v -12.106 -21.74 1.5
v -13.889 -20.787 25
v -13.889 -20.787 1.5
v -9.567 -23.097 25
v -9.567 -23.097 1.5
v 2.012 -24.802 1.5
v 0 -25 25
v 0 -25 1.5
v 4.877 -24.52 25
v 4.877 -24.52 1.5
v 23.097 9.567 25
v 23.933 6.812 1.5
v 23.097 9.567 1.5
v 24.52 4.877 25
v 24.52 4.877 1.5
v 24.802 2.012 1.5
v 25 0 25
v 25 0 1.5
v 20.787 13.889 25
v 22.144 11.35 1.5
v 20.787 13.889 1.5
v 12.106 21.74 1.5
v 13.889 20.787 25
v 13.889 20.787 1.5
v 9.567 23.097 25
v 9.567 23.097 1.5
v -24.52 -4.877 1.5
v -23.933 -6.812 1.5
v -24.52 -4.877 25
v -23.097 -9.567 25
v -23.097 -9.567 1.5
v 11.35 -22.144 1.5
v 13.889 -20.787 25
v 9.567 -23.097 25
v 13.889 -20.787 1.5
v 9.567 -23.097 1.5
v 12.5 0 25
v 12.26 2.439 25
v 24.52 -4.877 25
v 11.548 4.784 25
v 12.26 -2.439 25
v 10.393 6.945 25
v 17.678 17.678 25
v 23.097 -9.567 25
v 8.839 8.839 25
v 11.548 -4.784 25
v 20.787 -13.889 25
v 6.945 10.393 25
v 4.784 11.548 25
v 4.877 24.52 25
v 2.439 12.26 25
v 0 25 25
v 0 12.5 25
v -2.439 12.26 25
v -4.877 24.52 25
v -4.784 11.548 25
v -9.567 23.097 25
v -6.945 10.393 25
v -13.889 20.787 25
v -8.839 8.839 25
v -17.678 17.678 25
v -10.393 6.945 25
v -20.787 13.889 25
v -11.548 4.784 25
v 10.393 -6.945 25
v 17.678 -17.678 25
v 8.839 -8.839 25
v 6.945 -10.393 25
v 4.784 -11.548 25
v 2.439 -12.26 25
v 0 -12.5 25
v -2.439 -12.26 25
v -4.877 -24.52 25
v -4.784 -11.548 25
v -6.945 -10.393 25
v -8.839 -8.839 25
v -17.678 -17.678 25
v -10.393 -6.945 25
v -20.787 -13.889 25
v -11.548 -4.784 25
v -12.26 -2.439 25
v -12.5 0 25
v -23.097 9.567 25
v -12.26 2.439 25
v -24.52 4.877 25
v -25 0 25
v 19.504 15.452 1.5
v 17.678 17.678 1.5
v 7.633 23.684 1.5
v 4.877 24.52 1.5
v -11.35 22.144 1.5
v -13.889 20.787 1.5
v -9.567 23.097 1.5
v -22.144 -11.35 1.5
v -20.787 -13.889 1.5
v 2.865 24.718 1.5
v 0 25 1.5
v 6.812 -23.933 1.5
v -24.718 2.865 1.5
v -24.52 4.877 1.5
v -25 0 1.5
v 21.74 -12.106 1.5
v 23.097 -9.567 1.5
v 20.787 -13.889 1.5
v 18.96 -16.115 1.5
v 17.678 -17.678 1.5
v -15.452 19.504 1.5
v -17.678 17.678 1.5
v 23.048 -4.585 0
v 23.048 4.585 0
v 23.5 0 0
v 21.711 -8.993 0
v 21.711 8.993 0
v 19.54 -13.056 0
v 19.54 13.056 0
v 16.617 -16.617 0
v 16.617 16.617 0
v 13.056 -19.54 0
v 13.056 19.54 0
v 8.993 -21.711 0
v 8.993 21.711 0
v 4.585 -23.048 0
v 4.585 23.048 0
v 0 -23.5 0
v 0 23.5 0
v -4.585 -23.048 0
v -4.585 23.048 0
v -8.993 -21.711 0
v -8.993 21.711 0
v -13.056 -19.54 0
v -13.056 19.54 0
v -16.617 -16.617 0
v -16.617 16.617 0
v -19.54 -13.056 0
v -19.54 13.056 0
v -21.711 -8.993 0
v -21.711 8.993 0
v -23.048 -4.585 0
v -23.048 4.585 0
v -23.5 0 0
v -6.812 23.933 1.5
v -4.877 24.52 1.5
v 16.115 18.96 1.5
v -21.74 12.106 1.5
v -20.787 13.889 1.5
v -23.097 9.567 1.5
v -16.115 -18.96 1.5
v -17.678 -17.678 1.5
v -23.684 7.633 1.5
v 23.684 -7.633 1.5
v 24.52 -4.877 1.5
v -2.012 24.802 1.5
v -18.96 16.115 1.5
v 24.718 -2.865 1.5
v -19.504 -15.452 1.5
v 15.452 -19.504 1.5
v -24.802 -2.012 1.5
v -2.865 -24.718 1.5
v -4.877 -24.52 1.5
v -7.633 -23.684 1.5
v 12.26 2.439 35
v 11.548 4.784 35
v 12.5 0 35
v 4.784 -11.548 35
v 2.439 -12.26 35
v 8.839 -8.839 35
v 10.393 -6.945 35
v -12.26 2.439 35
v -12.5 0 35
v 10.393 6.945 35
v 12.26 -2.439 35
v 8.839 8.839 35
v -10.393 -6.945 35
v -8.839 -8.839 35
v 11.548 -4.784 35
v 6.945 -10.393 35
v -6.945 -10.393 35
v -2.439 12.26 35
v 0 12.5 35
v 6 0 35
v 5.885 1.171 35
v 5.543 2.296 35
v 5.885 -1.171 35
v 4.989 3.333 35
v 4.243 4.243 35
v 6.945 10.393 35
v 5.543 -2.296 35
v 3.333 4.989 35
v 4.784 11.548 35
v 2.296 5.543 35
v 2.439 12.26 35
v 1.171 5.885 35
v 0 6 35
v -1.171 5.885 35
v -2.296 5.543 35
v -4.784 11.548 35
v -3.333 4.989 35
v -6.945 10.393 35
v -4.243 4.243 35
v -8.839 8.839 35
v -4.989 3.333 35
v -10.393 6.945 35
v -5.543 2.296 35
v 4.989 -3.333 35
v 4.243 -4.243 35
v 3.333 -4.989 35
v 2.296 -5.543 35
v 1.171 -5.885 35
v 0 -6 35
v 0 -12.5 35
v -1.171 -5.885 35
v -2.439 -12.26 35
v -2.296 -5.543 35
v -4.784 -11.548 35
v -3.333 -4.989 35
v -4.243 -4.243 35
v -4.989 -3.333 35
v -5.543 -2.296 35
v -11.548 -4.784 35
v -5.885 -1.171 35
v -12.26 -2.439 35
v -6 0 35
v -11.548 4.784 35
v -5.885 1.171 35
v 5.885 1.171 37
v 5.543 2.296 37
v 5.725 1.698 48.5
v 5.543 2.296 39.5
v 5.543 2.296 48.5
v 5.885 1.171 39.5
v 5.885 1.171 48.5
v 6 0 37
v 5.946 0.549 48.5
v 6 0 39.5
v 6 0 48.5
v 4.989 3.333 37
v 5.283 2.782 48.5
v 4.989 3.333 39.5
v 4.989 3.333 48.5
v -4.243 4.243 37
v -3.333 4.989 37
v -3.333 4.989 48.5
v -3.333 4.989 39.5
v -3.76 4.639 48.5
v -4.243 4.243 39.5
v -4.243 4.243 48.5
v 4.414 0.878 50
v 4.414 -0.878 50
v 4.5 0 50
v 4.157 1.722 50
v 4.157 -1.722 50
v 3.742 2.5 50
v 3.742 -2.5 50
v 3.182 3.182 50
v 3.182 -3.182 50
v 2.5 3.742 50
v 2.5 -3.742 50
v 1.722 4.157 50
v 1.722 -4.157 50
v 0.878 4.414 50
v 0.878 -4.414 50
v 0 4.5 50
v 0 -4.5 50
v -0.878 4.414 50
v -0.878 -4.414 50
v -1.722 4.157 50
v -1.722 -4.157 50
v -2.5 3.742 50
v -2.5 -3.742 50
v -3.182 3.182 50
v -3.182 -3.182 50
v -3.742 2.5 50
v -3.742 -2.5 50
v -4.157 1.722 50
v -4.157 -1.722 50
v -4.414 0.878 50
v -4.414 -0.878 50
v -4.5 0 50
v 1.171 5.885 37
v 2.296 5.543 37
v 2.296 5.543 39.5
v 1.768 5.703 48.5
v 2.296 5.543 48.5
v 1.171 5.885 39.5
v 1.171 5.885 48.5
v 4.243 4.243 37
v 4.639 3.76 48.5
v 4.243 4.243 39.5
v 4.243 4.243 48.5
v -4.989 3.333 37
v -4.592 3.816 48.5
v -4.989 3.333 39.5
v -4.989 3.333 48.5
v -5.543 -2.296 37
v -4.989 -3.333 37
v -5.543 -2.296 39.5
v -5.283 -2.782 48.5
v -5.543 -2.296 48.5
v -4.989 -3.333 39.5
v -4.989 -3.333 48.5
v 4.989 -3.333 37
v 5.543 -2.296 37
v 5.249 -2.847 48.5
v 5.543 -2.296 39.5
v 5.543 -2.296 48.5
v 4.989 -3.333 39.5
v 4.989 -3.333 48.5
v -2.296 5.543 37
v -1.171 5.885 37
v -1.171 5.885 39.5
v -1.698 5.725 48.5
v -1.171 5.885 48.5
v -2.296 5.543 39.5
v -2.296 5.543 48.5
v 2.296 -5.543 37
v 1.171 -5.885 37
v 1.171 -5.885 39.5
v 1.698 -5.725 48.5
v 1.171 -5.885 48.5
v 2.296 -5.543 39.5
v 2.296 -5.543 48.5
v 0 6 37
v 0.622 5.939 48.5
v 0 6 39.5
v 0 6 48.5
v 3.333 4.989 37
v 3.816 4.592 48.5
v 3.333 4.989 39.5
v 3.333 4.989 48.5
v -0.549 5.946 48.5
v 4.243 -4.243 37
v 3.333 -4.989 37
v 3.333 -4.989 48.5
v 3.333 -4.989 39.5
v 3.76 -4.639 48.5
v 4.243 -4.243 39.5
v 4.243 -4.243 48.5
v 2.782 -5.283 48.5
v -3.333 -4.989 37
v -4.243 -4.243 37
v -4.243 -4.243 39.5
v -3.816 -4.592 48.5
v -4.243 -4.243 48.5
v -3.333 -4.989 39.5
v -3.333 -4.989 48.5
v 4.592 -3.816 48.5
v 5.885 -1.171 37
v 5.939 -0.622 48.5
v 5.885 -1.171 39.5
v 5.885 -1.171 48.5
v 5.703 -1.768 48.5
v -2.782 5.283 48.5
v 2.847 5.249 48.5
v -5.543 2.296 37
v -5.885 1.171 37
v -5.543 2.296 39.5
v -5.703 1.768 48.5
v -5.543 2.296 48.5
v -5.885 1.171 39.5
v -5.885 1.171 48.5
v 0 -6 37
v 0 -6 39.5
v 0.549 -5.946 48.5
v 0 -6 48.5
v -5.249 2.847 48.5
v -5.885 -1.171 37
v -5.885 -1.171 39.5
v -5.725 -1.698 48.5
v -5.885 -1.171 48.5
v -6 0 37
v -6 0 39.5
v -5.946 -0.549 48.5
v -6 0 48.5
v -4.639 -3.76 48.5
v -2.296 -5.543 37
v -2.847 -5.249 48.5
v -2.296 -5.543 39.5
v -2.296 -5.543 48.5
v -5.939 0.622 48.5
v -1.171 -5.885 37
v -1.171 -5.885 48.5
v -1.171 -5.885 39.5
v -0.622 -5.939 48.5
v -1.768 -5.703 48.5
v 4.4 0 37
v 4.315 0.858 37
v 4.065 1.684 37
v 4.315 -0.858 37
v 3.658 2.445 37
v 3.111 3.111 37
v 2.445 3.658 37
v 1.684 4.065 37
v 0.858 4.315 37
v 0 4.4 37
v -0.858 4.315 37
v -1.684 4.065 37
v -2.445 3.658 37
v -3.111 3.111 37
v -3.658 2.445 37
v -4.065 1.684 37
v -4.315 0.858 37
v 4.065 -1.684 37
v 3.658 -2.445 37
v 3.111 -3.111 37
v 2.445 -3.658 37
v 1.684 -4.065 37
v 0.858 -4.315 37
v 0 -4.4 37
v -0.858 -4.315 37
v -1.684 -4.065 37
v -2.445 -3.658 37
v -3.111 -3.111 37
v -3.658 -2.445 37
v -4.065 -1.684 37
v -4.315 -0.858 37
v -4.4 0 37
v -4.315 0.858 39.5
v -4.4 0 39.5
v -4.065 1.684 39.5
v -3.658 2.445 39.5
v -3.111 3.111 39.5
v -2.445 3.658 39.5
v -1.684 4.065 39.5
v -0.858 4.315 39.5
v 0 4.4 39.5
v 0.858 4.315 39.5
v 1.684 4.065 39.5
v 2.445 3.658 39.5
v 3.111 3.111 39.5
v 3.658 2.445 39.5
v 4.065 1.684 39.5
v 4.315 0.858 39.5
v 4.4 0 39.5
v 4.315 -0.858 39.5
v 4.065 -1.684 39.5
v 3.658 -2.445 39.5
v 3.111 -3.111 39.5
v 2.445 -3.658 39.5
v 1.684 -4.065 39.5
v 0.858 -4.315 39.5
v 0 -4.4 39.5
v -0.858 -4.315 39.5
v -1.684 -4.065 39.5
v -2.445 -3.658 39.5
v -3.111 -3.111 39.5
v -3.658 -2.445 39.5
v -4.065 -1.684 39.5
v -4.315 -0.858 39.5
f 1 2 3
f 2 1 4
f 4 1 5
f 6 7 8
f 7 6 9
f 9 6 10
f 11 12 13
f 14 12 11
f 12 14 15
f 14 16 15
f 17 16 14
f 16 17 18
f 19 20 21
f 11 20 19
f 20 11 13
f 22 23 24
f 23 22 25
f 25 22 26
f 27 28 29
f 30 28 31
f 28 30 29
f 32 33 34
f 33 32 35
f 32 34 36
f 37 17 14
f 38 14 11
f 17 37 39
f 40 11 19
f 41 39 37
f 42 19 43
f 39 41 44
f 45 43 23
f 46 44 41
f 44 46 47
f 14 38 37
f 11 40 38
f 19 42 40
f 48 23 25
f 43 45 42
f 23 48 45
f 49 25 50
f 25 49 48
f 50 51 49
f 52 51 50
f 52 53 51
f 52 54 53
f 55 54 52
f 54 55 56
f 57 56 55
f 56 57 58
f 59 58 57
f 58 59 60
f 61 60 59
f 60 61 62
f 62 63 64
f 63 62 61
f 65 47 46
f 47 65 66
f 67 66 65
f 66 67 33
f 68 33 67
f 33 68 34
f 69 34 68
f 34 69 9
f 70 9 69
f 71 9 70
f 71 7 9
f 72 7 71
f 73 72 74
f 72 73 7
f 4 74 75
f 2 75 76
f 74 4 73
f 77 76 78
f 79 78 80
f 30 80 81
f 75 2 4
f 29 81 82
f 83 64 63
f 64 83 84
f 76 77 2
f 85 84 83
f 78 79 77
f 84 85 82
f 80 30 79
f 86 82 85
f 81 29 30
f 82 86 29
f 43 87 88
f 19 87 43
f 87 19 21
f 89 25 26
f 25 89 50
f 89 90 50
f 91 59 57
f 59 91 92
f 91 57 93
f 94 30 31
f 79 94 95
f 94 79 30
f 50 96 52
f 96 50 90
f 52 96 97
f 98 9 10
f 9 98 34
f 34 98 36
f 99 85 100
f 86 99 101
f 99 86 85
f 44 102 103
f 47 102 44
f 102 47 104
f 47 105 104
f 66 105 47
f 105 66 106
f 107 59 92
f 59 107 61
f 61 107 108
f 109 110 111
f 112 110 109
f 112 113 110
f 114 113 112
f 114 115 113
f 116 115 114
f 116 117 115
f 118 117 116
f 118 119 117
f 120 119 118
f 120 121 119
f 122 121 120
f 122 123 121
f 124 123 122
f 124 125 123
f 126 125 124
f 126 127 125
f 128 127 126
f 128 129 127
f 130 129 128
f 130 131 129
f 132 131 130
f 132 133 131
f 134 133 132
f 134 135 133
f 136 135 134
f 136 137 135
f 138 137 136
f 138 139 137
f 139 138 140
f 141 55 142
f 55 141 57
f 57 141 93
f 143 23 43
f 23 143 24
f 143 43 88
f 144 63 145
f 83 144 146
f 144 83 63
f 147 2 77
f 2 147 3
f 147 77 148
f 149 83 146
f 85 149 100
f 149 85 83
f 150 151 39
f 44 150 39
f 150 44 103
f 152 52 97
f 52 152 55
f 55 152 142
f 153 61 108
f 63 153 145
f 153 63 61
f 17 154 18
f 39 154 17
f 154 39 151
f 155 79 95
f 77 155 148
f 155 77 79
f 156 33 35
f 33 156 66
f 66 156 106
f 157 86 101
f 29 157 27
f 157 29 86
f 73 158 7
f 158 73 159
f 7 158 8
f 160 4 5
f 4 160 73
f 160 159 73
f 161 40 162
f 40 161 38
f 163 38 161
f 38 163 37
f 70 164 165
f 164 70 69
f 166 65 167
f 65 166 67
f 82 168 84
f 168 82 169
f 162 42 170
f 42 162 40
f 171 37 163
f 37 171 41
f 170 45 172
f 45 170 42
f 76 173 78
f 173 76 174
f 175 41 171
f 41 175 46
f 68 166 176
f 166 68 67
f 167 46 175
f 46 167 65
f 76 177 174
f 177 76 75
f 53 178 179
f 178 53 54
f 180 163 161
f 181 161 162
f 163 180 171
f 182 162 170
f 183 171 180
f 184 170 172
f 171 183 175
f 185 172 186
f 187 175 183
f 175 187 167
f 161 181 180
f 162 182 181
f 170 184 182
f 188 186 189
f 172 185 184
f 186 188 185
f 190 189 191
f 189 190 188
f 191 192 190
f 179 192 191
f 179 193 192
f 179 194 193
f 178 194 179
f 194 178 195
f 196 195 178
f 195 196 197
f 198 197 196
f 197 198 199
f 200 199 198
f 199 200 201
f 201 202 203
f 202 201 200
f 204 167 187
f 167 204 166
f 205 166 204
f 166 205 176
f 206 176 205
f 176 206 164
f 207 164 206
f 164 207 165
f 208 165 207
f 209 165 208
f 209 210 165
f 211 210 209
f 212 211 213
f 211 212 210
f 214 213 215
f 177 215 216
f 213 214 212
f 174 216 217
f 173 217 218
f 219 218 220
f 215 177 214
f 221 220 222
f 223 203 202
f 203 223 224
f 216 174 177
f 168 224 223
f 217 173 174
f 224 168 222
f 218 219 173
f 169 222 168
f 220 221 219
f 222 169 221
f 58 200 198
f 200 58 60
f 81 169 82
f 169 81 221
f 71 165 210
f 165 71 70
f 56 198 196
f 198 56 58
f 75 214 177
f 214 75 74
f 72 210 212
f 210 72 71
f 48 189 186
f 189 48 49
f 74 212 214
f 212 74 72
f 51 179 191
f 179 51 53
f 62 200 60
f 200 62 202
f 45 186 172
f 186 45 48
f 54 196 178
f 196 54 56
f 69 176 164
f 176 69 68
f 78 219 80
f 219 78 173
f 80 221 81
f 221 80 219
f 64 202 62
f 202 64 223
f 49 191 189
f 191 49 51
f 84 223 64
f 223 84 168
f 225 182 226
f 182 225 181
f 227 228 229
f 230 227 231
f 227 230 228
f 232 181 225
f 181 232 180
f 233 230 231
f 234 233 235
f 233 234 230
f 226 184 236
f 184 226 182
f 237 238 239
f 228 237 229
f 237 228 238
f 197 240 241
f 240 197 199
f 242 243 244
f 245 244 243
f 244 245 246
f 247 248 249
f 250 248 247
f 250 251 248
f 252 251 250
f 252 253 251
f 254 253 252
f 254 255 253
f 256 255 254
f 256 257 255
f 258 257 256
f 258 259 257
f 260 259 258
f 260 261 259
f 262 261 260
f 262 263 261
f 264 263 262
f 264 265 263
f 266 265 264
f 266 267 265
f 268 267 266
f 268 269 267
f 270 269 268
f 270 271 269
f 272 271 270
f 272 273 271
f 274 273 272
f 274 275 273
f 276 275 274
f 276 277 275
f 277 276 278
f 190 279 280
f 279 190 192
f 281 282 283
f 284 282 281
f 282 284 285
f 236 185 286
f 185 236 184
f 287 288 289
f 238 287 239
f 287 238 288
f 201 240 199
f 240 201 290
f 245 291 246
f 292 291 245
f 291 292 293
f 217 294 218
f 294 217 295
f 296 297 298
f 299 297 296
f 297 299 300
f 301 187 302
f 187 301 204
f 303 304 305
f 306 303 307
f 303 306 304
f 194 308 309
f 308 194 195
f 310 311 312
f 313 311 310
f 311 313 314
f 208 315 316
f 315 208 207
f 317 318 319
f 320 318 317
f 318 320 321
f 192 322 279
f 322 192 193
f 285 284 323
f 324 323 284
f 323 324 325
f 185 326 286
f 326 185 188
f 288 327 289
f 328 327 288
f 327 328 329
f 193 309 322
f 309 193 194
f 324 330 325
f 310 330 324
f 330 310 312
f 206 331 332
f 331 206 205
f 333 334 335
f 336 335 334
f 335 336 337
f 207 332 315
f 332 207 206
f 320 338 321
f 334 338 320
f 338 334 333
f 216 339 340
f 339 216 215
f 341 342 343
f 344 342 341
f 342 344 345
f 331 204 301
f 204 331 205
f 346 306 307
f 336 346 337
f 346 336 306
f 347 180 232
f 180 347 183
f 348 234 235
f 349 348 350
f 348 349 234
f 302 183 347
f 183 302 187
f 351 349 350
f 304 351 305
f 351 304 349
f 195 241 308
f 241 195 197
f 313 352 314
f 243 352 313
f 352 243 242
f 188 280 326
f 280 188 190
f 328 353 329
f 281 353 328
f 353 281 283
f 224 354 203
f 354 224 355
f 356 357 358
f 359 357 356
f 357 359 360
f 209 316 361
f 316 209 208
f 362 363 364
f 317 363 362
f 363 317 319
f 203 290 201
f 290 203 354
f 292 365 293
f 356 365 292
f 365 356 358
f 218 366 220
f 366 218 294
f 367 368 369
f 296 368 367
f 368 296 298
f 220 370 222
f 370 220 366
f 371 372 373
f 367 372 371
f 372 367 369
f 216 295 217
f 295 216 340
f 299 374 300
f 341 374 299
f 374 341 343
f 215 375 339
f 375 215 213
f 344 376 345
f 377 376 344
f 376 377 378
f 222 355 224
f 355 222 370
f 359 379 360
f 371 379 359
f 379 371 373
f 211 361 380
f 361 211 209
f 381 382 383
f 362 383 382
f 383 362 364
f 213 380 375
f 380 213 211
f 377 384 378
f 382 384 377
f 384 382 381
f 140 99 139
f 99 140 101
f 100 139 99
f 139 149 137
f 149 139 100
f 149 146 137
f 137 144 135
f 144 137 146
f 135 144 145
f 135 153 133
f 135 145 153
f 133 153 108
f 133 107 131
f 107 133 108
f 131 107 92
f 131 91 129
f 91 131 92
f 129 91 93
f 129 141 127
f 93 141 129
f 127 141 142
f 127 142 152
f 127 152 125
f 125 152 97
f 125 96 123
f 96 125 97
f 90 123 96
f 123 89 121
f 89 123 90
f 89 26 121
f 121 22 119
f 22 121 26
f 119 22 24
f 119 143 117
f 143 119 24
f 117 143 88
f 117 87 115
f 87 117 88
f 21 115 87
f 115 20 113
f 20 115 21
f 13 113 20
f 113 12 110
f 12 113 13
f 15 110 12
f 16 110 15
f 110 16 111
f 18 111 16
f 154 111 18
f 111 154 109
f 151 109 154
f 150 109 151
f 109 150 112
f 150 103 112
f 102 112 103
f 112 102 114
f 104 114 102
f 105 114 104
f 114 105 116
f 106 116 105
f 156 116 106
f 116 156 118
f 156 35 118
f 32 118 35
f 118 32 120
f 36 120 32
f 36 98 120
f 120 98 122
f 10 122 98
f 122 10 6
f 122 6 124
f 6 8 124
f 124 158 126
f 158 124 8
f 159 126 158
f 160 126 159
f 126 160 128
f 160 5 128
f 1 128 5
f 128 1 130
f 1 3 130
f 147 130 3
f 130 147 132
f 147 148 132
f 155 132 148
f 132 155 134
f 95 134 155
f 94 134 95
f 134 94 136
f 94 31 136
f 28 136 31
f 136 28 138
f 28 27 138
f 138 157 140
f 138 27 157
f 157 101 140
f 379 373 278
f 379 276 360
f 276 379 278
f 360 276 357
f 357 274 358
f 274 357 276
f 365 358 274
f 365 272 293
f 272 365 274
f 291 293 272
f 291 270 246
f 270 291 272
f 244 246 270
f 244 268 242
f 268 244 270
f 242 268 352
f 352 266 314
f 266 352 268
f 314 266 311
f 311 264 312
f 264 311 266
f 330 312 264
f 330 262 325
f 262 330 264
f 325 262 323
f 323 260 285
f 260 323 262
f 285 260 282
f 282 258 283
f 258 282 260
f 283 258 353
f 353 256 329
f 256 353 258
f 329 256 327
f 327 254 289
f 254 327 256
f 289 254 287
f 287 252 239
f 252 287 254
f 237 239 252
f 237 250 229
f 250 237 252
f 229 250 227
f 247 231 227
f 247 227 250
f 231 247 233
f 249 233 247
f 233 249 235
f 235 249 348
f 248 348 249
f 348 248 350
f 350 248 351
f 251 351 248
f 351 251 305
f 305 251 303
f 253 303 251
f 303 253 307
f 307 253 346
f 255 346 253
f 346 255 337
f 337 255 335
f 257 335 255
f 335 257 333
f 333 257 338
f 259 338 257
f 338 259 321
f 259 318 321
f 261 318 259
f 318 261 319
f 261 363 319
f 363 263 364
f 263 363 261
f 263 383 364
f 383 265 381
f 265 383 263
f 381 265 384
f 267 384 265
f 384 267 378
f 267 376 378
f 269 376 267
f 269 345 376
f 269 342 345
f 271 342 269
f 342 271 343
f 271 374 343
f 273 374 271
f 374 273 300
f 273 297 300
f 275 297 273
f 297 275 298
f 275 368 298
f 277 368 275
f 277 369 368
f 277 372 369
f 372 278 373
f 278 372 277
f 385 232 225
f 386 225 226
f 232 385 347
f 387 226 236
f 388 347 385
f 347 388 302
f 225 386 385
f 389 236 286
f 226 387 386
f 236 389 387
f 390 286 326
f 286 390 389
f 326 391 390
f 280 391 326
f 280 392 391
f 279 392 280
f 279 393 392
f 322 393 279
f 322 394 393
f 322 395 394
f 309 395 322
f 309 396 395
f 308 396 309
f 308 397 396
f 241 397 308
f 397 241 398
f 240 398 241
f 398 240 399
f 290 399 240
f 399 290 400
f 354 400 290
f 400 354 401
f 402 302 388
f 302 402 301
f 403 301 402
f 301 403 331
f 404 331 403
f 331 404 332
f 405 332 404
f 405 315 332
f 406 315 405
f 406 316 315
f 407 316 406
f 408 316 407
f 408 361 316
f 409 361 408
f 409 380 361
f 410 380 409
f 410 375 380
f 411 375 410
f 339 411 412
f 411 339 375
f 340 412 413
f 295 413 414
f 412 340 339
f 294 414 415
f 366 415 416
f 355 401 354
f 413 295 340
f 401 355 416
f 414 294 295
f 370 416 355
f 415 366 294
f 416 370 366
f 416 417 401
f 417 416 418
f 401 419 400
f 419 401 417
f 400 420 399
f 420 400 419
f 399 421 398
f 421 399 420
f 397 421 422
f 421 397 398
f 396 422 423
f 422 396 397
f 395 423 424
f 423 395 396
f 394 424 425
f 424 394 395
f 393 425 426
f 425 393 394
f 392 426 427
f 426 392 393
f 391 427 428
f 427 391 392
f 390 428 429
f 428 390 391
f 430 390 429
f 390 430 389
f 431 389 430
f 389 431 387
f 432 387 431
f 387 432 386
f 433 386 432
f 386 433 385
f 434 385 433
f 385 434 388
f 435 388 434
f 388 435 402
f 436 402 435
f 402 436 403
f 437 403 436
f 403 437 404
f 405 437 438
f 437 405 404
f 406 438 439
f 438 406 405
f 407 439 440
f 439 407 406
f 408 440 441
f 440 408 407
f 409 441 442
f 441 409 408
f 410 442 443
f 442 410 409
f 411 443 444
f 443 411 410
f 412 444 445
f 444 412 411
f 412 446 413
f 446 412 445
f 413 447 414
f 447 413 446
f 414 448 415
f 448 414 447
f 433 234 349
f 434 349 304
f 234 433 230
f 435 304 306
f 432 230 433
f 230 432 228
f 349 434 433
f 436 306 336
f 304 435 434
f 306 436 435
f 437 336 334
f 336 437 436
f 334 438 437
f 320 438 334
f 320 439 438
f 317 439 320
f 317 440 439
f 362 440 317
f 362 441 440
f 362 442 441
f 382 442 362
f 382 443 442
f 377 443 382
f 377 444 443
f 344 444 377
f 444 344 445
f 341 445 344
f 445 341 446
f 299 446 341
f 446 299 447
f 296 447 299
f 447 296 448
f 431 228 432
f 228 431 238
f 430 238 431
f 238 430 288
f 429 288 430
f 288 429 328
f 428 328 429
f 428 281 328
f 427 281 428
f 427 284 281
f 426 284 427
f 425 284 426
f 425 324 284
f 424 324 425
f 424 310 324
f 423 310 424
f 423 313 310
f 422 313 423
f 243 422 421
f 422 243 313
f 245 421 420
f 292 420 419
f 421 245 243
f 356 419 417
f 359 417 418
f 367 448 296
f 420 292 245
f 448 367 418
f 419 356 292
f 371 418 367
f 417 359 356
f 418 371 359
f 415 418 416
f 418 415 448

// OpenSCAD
$fn = 32;

// ----------------------------------------------------------------------
// Stepped shaft: diameters 50, 25, 12 mm, 50 mm long
// ----------------------------------------------------------------------

// --- parameters (mm) ---
d1 = 50;                  // step 1 diameter
len1 = 25;                // step 1 length
d2 = 25;                  // step 2 diameter
len2 = 10;                // step 2 length
d3 = 12;                  // step 3 diameter
len3 = 15;                // step 3 length
total = 50;               // overall length
chamfer = 1.5;            // end chamfer
groove_r = 6;             // groove radius
groove_z = 37;            // groove position from the end
groove_w = 2.5;           // groove width
groove_d = 1.6;           // groove depth

difference() {
  /* turned body: stacked cylinders, every step sunk into the bigger one */
  union() {
    cylinder(h = len1, d = d1);
    translate([0, 0, 24.6]) cylinder(h = 10.4, d = d2);
    translate([0, 0, 34.6]) cylinder(h = 15.4, d = d3);
  }
  /* bottom chamfer ring cut */
  rotate_extrude() translate([23.5, -2.5]) polygon([[0, 0], [4, 0], [4, 6.5], [0, 2.5]]);
  /* top chamfer ring cut */
  rotate_extrude() translate([4.5, 50]) polygon([[0, 0], [4, -4], [4, 2.5], [0, 2.5]]);
  /* circlip groove just behind the shoulder */
  rotate_extrude() translate([groove_r - groove_d, groove_z]) square([groove_d + 2.5, groove_w]);
}
